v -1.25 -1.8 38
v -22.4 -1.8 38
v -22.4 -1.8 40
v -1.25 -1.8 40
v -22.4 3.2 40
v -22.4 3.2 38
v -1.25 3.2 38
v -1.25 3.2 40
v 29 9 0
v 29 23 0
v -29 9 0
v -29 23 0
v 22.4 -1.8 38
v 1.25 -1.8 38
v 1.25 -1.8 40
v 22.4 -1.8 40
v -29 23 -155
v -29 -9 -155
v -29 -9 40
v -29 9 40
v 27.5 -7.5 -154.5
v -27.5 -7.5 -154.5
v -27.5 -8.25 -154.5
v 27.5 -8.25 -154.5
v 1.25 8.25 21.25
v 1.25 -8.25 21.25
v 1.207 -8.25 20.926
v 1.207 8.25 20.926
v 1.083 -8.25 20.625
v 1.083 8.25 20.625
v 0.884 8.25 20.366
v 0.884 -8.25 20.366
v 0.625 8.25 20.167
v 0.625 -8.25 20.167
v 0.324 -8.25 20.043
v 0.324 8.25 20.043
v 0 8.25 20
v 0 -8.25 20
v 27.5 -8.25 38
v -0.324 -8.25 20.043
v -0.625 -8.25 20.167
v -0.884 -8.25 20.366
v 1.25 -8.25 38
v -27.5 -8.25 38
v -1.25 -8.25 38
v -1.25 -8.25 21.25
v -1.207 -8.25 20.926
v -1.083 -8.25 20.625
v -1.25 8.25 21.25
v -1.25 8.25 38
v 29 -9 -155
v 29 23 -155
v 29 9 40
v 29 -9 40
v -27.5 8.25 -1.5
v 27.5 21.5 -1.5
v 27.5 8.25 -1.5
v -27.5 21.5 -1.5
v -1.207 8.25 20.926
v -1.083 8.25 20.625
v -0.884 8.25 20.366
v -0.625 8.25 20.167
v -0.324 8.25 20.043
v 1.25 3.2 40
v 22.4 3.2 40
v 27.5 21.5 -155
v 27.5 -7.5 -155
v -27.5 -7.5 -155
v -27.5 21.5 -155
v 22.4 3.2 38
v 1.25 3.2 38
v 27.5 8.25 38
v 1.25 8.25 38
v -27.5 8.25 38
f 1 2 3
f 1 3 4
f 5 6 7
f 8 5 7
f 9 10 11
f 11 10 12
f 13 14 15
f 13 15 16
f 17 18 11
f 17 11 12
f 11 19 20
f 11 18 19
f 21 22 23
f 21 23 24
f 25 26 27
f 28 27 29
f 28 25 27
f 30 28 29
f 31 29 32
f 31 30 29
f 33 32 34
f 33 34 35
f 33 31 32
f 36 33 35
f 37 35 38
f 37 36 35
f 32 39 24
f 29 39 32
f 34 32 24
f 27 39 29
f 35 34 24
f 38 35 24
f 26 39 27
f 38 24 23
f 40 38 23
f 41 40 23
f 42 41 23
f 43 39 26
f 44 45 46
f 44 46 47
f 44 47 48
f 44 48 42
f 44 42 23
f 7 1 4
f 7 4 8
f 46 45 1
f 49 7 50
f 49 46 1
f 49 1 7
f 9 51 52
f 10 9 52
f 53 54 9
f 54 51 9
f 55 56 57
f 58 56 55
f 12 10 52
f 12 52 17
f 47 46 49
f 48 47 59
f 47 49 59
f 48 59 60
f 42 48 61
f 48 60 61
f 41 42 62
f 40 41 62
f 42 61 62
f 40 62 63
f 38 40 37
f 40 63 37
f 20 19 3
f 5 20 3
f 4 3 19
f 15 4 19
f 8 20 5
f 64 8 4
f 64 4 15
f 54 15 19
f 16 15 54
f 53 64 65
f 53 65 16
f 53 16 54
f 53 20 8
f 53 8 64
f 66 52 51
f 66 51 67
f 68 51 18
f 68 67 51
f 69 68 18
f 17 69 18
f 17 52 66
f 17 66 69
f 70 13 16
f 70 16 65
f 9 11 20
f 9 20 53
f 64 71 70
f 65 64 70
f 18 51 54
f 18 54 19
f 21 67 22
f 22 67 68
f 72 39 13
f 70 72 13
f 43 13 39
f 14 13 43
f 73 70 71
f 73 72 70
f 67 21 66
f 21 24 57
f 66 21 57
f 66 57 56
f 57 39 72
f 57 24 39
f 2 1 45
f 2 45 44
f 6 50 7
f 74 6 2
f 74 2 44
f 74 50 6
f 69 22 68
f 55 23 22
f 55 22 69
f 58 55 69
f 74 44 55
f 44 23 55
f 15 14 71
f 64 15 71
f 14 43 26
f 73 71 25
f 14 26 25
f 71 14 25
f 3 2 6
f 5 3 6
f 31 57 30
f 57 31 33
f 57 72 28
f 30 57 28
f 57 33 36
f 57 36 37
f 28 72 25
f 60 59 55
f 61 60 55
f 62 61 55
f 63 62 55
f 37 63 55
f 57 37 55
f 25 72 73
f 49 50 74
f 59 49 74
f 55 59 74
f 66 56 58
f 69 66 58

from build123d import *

# Parameters (mm, degrees)
SKETCH1_W           = 58
SKETCH1_H           = 18
SKETCH1_W_2         = 21.15
SKETCH1_H_2         = 5
BOSS_EXTRUDE1_DEPTH = 40
SKETCH2_W           = 58
SKETCH2_H           = 32
BOSS_EXTRUDE2_DEPTH = 155
CUT_EXTRUDE1_START  = 2
SKETCH3_W           = 55
SKETCH3_H           = 16.5
CUT_EXTRUDE1_DEPTH  = 39
SKETCH4_W           = 2.5
SKETCH4_H           = 16.5
BOSS_EXTRUDE3_DEPTH = 20
FILLET1_R           = 1.25
SKETCH5_W           = 55
SKETCH5_H           = 29
CUT_EXTRUDE2_DEPTH  = 153.5
SKETCH6_W           = 55
SKETCH6_H           = 16.5
CUT_EXTRUDE3_DEPTH  = 153.5


with BuildPart() as part:
    # Sketch1 → Boss-Extrude1 (new body)
    with BuildSketch(Plane.XY):
        Rectangle(SKETCH1_W, SKETCH1_H)
        with Locations((-11.825, 0.7)):
            Rectangle(SKETCH1_W_2, SKETCH1_H_2, mode=Mode.SUBTRACT)
        with Locations((11.825, 0.7)):
            Rectangle(SKETCH1_W_2, SKETCH1_H_2, mode=Mode.SUBTRACT)
    extrude(amount=BOSS_EXTRUDE1_DEPTH)

    # Sketch2 → Boss-Extrude2 (add)
    with BuildSketch(Plane(origin=(0, 0, 0), x_dir=(-1, 0, 0), z_dir=(0, 0, -1))):
        with Locations((0, 7)):
            Rectangle(SKETCH2_W, SKETCH2_H)
    extrude(amount=BOSS_EXTRUDE2_DEPTH)

    # Sketch3 → Cut-Extrude1 (cut)
    with BuildSketch(Plane(origin=(0, 0, 40), x_dir=(-1, 0, 0), z_dir=(0, 0, -1)).offset(CUT_EXTRUDE1_START)):
        Rectangle(SKETCH3_W, SKETCH3_H)
    extrude(amount=CUT_EXTRUDE1_DEPTH, mode=Mode.SUBTRACT)

    # Sketch4 → Boss-Extrude3 (add)
    with BuildSketch(Plane(origin=(0, 0, 40), x_dir=(-1, 0, 0), z_dir=(0, 0, -1))):
        Rectangle(SKETCH4_W, SKETCH4_H)
    extrude(amount=BOSS_EXTRUDE3_DEPTH)

    # Fillet1
    fillet1_edges = [part.edges().sort_by_distance(p)[0] for p in [
        (1.25, 0, 20),
        (-1.25, 0, 20),
    ]]
    fillet(fillet1_edges, radius=FILLET1_R - 0.0001)  # a hair under: the kernel refuses the full size

    # Sketch5 → Cut-Extrude2 (cut)
    with BuildSketch(Plane(origin=(0, 0, -155), x_dir=(-1, 0, 0), z_dir=(0, 0, -1))):
        with Locations((0, 7)):
            Rectangle(SKETCH5_W, SKETCH5_H)
    extrude(amount=-CUT_EXTRUDE2_DEPTH, mode=Mode.SUBTRACT)

    # Sketch6 → Cut-Extrude3 (cut)
    with BuildSketch(Plane.XY.offset(-1)):
        Rectangle(SKETCH6_W, SKETCH6_H)
    extrude(amount=-CUT_EXTRUDE3_DEPTH, mode=Mode.SUBTRACT)


solid = part.part
